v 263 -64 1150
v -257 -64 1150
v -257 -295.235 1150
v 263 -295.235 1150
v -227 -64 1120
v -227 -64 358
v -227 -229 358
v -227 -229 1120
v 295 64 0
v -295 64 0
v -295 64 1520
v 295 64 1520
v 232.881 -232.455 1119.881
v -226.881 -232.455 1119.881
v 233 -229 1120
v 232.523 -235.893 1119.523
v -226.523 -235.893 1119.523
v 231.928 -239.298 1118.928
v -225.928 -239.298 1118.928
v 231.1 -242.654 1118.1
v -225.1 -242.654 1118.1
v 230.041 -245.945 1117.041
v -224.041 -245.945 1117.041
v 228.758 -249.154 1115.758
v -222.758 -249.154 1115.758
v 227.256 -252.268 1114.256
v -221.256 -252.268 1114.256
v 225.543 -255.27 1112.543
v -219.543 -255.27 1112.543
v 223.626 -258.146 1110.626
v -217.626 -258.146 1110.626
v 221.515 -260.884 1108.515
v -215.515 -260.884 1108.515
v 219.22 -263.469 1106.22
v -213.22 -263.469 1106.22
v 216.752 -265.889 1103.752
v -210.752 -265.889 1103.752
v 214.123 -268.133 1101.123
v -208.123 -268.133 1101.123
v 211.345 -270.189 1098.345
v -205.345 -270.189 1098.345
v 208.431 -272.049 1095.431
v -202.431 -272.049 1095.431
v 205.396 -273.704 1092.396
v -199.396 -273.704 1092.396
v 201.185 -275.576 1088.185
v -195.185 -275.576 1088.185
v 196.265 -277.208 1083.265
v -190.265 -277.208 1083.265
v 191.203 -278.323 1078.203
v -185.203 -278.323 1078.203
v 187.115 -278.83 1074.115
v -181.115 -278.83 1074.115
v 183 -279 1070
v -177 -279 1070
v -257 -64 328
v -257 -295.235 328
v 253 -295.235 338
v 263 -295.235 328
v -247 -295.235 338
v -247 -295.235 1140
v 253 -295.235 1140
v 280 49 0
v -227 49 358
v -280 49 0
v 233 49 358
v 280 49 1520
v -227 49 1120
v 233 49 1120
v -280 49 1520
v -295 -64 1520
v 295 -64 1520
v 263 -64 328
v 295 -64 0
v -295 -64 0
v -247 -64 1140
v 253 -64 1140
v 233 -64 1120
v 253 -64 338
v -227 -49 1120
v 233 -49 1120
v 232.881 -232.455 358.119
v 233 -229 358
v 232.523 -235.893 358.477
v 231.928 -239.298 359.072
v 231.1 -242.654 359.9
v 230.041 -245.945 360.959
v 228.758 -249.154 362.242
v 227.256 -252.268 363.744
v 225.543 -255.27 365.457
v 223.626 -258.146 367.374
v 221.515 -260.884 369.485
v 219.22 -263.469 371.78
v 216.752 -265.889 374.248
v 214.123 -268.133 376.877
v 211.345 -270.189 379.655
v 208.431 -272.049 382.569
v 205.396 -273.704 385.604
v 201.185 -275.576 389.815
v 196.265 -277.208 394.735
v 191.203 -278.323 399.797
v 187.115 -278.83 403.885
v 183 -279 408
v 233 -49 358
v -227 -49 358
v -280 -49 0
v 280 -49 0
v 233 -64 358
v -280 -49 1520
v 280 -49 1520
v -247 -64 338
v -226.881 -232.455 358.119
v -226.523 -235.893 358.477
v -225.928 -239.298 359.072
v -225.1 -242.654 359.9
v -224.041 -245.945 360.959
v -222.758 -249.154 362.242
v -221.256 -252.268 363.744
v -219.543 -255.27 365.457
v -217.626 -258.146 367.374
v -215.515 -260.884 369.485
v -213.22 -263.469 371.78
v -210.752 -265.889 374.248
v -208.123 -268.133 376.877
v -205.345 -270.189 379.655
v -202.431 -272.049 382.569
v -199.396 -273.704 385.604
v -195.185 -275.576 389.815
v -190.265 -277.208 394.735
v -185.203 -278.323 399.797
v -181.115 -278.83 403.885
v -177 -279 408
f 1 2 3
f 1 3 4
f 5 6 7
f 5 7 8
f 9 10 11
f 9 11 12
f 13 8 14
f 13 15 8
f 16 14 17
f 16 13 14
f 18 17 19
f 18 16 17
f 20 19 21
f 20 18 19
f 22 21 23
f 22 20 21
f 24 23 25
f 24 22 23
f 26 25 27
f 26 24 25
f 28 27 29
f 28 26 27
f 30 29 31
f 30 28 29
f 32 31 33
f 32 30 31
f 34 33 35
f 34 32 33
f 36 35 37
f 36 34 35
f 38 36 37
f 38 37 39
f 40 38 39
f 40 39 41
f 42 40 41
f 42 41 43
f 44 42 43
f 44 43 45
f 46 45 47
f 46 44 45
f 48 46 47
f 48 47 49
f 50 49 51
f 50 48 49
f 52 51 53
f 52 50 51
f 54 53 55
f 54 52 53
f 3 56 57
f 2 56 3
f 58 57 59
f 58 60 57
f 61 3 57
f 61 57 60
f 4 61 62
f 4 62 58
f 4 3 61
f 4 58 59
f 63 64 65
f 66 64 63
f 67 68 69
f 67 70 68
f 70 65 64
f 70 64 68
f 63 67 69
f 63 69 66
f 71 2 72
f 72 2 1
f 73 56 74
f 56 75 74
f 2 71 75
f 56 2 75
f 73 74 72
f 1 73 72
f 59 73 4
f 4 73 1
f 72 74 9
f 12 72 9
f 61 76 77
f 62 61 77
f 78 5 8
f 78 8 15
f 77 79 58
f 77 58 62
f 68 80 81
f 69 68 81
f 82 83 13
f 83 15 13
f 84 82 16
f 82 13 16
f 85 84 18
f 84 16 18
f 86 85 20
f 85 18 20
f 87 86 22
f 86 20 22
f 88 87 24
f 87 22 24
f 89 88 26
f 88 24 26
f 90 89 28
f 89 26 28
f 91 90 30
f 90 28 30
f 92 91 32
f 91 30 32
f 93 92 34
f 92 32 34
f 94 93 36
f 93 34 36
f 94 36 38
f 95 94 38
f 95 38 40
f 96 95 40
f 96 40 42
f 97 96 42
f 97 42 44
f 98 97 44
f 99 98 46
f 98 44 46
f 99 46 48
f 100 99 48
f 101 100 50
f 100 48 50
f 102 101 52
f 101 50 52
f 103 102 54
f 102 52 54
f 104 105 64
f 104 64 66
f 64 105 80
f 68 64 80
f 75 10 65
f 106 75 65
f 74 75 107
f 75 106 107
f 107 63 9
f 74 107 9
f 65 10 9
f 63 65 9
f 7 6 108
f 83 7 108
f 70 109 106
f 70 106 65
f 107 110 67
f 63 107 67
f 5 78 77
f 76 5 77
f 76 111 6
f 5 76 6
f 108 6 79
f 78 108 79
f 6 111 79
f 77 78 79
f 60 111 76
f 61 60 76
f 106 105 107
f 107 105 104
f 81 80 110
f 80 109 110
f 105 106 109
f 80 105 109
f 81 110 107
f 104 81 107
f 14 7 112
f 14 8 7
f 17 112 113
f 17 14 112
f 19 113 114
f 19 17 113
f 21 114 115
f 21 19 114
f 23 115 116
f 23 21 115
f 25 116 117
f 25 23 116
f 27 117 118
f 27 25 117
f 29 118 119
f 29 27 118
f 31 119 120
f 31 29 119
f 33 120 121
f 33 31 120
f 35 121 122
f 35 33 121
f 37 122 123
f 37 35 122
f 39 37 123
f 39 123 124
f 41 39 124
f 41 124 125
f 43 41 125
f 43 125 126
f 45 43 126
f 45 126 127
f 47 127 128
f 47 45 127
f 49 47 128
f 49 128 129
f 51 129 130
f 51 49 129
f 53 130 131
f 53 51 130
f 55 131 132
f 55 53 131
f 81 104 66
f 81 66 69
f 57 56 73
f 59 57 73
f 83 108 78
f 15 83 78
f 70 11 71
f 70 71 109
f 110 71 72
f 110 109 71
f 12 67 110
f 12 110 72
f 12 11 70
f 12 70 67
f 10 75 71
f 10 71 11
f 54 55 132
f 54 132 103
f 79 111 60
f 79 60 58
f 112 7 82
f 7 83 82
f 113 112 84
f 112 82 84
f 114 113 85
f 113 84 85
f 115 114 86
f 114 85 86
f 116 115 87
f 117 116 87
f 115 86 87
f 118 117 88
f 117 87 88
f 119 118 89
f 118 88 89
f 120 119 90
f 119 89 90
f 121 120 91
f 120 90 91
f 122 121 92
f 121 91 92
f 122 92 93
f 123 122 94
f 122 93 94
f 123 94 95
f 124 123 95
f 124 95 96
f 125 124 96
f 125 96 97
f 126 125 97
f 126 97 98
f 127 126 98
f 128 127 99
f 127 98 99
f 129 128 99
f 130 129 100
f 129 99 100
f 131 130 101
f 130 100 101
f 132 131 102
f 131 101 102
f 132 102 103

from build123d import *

# Parameters (mm, degrees)
F0_W          = 590
F0_H          = 128
F1_DEPTH      = 1520
F2_W          = 560
F2_H          = 98
F3_DEPTH      = 1520.001
F4_W          = 460
F4_H          = 762
F5_DEPTH      = 215
F5_DEPTH_BACK = 128
F6_R          = 50
F7_W          = 520
F7_H          = 822
F7_W_2        = 500
F7_H_2        = 802
F8_DEPTH      = 231.234834


with BuildPart() as f1:
    # F0 (on Top) → F1 (new body)
    with BuildSketch(Plane.XY):
        Rectangle(F0_W, F0_H)
    extrude(amount=F1_DEPTH)

    # F2 (on face) → F3 (cut, through all)
    with BuildSketch(Plane.XY.offset(1520)):
        Rectangle(F2_W, F2_H)
    extrude(amount=-F3_DEPTH, mode=Mode.SUBTRACT)

    # F4 (on face) → F5 (join, two sides)
    with BuildSketch(Plane.XZ.offset(64)) as f5_sk:
        with Locations((3, 739)):
            Rectangle(F4_W, F4_H)
    extrude(amount=F5_DEPTH)
    extrude(f5_sk.sketch, amount=-F5_DEPTH_BACK)

    # F6
    f6_edges = [f1.edges().sort_by_distance(p)[0] for p in [
        (233, -279, 739),
        (-227, -279, 739),
        (3, -279, 358),
        (3, -279, 1120),
    ]]
    fillet(f6_edges, radius=F6_R)

    # F7 (on face) → F8 (join)
    with BuildSketch(Plane.XZ.offset(64)):
        with Locations((3, 739)):
            Rectangle(F7_W, F7_H)
        with Locations((3, 739)):
            Rectangle(F7_W_2, F7_H_2, mode=Mode.SUBTRACT)
    extrude(amount=F8_DEPTH)


solid = f1.part
